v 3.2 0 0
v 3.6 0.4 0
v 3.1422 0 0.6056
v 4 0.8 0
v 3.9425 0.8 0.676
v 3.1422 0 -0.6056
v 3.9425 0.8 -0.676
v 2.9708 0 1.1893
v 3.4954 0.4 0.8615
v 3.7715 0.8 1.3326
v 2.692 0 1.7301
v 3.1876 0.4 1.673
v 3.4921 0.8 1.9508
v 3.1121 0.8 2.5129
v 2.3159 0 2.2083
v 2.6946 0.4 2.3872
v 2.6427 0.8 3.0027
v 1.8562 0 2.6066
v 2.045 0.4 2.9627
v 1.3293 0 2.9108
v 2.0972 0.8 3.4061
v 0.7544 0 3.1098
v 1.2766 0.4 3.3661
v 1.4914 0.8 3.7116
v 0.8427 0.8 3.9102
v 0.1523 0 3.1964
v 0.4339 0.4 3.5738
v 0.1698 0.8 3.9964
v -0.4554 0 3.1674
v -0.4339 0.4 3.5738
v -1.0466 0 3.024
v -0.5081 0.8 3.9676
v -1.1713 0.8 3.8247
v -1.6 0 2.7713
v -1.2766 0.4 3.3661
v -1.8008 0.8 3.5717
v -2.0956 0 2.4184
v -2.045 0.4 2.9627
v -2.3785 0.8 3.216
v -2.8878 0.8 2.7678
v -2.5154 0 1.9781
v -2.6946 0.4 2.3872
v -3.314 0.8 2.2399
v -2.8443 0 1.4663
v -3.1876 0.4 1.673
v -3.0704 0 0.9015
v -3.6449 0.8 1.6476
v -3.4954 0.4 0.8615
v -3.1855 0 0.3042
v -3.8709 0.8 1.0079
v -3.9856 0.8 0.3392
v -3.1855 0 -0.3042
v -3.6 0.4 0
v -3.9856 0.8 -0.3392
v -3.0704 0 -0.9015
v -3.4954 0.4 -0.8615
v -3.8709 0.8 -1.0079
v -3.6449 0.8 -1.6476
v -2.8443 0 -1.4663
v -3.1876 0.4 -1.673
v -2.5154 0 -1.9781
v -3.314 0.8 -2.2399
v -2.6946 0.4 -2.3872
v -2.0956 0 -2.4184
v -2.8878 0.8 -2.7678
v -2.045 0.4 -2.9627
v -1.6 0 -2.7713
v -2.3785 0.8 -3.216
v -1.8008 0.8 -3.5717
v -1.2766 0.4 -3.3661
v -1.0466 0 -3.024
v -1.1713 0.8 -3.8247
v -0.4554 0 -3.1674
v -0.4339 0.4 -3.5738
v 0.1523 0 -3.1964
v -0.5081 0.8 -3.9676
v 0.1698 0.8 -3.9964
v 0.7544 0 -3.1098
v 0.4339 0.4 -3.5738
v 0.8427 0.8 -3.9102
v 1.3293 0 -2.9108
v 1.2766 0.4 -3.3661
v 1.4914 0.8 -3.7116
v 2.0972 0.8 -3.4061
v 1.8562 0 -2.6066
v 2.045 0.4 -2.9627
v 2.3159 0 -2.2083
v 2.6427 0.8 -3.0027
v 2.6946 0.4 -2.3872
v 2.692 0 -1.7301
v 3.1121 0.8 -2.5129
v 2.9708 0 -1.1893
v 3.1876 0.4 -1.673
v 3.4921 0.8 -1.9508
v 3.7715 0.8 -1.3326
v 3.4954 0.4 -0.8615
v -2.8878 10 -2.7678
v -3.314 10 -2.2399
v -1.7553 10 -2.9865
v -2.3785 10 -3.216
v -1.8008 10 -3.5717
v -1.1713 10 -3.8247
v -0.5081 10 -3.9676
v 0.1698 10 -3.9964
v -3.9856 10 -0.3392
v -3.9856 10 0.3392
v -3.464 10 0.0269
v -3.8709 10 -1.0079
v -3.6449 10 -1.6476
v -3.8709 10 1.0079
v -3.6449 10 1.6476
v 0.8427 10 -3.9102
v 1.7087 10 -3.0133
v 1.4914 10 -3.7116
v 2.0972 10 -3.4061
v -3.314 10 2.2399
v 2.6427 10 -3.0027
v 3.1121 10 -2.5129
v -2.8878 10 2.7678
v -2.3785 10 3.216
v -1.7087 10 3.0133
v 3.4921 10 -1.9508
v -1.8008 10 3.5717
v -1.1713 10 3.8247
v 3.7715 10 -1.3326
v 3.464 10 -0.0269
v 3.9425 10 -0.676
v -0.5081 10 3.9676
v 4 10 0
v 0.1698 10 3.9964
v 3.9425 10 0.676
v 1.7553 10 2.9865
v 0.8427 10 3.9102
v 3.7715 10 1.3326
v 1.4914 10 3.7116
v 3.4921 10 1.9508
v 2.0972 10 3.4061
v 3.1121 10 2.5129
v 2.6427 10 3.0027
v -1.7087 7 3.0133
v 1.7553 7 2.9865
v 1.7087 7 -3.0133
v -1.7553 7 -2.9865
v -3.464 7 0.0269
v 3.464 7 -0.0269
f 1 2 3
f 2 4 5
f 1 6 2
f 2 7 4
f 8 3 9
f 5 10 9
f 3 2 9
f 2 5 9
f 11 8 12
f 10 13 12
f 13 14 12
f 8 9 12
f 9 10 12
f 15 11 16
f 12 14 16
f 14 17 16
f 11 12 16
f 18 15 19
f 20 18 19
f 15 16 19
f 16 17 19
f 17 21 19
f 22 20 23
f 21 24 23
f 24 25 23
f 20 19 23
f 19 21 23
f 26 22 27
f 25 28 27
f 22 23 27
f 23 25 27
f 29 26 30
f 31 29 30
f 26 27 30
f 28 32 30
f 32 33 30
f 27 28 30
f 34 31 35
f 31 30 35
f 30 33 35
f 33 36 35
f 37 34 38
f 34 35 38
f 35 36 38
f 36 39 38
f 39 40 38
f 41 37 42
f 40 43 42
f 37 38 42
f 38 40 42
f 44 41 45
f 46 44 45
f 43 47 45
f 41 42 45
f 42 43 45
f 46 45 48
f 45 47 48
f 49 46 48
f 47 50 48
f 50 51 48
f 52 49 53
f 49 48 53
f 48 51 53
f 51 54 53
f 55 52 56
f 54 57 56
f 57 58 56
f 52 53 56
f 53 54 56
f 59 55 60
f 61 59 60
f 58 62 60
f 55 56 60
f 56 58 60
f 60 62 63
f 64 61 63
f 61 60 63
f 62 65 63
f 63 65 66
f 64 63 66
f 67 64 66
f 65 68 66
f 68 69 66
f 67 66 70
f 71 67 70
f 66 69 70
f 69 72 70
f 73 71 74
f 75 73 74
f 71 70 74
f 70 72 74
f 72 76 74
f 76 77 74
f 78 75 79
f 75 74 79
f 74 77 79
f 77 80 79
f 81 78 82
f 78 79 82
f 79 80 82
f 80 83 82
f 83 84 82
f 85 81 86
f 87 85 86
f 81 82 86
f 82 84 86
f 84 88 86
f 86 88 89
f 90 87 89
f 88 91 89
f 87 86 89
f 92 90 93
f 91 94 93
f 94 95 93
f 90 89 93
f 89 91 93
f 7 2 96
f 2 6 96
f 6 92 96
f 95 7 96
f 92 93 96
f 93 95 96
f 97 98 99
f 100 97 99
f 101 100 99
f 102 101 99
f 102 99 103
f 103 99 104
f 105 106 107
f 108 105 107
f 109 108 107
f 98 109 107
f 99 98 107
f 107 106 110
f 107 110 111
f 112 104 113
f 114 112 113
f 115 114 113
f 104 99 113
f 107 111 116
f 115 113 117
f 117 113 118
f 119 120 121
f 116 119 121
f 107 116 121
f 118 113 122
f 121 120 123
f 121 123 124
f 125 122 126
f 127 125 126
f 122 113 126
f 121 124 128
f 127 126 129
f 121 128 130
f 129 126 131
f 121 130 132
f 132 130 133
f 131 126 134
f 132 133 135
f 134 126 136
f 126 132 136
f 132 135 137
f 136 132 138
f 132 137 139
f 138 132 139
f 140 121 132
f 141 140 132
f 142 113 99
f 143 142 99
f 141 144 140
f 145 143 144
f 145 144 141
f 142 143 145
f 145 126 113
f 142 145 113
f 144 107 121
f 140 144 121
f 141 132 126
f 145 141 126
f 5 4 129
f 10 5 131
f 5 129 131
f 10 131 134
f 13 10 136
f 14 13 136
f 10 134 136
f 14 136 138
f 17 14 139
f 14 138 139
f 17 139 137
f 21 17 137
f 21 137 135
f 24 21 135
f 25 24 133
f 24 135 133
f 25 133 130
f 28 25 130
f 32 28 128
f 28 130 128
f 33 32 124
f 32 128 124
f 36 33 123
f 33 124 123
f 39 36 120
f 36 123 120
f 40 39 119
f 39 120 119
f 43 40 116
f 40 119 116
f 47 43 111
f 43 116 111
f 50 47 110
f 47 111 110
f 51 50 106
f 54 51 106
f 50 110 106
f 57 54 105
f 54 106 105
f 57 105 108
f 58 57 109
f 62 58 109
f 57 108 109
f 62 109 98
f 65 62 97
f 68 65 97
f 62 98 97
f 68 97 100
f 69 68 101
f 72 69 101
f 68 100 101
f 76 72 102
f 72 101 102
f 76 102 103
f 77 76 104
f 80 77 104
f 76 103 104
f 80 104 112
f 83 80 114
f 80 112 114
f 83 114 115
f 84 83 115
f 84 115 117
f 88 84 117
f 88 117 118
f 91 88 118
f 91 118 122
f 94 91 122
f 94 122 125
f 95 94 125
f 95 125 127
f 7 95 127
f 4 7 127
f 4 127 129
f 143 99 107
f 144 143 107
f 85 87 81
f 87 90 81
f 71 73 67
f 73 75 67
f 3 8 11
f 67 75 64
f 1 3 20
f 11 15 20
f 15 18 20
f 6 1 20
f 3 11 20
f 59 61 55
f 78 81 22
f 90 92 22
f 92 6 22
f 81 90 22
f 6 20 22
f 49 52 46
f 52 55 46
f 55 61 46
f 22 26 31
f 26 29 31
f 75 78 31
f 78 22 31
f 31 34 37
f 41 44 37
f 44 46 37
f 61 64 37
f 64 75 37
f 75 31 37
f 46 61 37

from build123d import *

# Parameters (mm, degrees)
CUT_EXTRUDE_1_DEPTH = 3


with BuildPart() as part:
    # Эскиз1 → Повернуть1 (revolve)
    with BuildSketch(Plane.XY):
        Polygon((0, 0), (3.2, 0), (4, 0.8), (4, 10), (0, 10), align=None)
    revolve(axis=Axis((0, 68.644575989, 0), (0, -1, 0)))

    # Эскиз2 → Вырез-Вытянуть1 (cut)
    with BuildSketch(Plane(origin=(0, 10, 0), x_dir=(1, 0, 0), z_dir=(0, 1, 0))):
        Polygon((1.755265403, -2.986476748), (3.463997433, 0.026866056), (1.708732029, 3.013342804), (-1.755265403, 2.986476748), (-3.463997433, -0.026866056), (-1.708732029, -3.013342804), align=None)
    extrude(amount=-CUT_EXTRUDE_1_DEPTH, mode=Mode.SUBTRACT)


solid = part.part
